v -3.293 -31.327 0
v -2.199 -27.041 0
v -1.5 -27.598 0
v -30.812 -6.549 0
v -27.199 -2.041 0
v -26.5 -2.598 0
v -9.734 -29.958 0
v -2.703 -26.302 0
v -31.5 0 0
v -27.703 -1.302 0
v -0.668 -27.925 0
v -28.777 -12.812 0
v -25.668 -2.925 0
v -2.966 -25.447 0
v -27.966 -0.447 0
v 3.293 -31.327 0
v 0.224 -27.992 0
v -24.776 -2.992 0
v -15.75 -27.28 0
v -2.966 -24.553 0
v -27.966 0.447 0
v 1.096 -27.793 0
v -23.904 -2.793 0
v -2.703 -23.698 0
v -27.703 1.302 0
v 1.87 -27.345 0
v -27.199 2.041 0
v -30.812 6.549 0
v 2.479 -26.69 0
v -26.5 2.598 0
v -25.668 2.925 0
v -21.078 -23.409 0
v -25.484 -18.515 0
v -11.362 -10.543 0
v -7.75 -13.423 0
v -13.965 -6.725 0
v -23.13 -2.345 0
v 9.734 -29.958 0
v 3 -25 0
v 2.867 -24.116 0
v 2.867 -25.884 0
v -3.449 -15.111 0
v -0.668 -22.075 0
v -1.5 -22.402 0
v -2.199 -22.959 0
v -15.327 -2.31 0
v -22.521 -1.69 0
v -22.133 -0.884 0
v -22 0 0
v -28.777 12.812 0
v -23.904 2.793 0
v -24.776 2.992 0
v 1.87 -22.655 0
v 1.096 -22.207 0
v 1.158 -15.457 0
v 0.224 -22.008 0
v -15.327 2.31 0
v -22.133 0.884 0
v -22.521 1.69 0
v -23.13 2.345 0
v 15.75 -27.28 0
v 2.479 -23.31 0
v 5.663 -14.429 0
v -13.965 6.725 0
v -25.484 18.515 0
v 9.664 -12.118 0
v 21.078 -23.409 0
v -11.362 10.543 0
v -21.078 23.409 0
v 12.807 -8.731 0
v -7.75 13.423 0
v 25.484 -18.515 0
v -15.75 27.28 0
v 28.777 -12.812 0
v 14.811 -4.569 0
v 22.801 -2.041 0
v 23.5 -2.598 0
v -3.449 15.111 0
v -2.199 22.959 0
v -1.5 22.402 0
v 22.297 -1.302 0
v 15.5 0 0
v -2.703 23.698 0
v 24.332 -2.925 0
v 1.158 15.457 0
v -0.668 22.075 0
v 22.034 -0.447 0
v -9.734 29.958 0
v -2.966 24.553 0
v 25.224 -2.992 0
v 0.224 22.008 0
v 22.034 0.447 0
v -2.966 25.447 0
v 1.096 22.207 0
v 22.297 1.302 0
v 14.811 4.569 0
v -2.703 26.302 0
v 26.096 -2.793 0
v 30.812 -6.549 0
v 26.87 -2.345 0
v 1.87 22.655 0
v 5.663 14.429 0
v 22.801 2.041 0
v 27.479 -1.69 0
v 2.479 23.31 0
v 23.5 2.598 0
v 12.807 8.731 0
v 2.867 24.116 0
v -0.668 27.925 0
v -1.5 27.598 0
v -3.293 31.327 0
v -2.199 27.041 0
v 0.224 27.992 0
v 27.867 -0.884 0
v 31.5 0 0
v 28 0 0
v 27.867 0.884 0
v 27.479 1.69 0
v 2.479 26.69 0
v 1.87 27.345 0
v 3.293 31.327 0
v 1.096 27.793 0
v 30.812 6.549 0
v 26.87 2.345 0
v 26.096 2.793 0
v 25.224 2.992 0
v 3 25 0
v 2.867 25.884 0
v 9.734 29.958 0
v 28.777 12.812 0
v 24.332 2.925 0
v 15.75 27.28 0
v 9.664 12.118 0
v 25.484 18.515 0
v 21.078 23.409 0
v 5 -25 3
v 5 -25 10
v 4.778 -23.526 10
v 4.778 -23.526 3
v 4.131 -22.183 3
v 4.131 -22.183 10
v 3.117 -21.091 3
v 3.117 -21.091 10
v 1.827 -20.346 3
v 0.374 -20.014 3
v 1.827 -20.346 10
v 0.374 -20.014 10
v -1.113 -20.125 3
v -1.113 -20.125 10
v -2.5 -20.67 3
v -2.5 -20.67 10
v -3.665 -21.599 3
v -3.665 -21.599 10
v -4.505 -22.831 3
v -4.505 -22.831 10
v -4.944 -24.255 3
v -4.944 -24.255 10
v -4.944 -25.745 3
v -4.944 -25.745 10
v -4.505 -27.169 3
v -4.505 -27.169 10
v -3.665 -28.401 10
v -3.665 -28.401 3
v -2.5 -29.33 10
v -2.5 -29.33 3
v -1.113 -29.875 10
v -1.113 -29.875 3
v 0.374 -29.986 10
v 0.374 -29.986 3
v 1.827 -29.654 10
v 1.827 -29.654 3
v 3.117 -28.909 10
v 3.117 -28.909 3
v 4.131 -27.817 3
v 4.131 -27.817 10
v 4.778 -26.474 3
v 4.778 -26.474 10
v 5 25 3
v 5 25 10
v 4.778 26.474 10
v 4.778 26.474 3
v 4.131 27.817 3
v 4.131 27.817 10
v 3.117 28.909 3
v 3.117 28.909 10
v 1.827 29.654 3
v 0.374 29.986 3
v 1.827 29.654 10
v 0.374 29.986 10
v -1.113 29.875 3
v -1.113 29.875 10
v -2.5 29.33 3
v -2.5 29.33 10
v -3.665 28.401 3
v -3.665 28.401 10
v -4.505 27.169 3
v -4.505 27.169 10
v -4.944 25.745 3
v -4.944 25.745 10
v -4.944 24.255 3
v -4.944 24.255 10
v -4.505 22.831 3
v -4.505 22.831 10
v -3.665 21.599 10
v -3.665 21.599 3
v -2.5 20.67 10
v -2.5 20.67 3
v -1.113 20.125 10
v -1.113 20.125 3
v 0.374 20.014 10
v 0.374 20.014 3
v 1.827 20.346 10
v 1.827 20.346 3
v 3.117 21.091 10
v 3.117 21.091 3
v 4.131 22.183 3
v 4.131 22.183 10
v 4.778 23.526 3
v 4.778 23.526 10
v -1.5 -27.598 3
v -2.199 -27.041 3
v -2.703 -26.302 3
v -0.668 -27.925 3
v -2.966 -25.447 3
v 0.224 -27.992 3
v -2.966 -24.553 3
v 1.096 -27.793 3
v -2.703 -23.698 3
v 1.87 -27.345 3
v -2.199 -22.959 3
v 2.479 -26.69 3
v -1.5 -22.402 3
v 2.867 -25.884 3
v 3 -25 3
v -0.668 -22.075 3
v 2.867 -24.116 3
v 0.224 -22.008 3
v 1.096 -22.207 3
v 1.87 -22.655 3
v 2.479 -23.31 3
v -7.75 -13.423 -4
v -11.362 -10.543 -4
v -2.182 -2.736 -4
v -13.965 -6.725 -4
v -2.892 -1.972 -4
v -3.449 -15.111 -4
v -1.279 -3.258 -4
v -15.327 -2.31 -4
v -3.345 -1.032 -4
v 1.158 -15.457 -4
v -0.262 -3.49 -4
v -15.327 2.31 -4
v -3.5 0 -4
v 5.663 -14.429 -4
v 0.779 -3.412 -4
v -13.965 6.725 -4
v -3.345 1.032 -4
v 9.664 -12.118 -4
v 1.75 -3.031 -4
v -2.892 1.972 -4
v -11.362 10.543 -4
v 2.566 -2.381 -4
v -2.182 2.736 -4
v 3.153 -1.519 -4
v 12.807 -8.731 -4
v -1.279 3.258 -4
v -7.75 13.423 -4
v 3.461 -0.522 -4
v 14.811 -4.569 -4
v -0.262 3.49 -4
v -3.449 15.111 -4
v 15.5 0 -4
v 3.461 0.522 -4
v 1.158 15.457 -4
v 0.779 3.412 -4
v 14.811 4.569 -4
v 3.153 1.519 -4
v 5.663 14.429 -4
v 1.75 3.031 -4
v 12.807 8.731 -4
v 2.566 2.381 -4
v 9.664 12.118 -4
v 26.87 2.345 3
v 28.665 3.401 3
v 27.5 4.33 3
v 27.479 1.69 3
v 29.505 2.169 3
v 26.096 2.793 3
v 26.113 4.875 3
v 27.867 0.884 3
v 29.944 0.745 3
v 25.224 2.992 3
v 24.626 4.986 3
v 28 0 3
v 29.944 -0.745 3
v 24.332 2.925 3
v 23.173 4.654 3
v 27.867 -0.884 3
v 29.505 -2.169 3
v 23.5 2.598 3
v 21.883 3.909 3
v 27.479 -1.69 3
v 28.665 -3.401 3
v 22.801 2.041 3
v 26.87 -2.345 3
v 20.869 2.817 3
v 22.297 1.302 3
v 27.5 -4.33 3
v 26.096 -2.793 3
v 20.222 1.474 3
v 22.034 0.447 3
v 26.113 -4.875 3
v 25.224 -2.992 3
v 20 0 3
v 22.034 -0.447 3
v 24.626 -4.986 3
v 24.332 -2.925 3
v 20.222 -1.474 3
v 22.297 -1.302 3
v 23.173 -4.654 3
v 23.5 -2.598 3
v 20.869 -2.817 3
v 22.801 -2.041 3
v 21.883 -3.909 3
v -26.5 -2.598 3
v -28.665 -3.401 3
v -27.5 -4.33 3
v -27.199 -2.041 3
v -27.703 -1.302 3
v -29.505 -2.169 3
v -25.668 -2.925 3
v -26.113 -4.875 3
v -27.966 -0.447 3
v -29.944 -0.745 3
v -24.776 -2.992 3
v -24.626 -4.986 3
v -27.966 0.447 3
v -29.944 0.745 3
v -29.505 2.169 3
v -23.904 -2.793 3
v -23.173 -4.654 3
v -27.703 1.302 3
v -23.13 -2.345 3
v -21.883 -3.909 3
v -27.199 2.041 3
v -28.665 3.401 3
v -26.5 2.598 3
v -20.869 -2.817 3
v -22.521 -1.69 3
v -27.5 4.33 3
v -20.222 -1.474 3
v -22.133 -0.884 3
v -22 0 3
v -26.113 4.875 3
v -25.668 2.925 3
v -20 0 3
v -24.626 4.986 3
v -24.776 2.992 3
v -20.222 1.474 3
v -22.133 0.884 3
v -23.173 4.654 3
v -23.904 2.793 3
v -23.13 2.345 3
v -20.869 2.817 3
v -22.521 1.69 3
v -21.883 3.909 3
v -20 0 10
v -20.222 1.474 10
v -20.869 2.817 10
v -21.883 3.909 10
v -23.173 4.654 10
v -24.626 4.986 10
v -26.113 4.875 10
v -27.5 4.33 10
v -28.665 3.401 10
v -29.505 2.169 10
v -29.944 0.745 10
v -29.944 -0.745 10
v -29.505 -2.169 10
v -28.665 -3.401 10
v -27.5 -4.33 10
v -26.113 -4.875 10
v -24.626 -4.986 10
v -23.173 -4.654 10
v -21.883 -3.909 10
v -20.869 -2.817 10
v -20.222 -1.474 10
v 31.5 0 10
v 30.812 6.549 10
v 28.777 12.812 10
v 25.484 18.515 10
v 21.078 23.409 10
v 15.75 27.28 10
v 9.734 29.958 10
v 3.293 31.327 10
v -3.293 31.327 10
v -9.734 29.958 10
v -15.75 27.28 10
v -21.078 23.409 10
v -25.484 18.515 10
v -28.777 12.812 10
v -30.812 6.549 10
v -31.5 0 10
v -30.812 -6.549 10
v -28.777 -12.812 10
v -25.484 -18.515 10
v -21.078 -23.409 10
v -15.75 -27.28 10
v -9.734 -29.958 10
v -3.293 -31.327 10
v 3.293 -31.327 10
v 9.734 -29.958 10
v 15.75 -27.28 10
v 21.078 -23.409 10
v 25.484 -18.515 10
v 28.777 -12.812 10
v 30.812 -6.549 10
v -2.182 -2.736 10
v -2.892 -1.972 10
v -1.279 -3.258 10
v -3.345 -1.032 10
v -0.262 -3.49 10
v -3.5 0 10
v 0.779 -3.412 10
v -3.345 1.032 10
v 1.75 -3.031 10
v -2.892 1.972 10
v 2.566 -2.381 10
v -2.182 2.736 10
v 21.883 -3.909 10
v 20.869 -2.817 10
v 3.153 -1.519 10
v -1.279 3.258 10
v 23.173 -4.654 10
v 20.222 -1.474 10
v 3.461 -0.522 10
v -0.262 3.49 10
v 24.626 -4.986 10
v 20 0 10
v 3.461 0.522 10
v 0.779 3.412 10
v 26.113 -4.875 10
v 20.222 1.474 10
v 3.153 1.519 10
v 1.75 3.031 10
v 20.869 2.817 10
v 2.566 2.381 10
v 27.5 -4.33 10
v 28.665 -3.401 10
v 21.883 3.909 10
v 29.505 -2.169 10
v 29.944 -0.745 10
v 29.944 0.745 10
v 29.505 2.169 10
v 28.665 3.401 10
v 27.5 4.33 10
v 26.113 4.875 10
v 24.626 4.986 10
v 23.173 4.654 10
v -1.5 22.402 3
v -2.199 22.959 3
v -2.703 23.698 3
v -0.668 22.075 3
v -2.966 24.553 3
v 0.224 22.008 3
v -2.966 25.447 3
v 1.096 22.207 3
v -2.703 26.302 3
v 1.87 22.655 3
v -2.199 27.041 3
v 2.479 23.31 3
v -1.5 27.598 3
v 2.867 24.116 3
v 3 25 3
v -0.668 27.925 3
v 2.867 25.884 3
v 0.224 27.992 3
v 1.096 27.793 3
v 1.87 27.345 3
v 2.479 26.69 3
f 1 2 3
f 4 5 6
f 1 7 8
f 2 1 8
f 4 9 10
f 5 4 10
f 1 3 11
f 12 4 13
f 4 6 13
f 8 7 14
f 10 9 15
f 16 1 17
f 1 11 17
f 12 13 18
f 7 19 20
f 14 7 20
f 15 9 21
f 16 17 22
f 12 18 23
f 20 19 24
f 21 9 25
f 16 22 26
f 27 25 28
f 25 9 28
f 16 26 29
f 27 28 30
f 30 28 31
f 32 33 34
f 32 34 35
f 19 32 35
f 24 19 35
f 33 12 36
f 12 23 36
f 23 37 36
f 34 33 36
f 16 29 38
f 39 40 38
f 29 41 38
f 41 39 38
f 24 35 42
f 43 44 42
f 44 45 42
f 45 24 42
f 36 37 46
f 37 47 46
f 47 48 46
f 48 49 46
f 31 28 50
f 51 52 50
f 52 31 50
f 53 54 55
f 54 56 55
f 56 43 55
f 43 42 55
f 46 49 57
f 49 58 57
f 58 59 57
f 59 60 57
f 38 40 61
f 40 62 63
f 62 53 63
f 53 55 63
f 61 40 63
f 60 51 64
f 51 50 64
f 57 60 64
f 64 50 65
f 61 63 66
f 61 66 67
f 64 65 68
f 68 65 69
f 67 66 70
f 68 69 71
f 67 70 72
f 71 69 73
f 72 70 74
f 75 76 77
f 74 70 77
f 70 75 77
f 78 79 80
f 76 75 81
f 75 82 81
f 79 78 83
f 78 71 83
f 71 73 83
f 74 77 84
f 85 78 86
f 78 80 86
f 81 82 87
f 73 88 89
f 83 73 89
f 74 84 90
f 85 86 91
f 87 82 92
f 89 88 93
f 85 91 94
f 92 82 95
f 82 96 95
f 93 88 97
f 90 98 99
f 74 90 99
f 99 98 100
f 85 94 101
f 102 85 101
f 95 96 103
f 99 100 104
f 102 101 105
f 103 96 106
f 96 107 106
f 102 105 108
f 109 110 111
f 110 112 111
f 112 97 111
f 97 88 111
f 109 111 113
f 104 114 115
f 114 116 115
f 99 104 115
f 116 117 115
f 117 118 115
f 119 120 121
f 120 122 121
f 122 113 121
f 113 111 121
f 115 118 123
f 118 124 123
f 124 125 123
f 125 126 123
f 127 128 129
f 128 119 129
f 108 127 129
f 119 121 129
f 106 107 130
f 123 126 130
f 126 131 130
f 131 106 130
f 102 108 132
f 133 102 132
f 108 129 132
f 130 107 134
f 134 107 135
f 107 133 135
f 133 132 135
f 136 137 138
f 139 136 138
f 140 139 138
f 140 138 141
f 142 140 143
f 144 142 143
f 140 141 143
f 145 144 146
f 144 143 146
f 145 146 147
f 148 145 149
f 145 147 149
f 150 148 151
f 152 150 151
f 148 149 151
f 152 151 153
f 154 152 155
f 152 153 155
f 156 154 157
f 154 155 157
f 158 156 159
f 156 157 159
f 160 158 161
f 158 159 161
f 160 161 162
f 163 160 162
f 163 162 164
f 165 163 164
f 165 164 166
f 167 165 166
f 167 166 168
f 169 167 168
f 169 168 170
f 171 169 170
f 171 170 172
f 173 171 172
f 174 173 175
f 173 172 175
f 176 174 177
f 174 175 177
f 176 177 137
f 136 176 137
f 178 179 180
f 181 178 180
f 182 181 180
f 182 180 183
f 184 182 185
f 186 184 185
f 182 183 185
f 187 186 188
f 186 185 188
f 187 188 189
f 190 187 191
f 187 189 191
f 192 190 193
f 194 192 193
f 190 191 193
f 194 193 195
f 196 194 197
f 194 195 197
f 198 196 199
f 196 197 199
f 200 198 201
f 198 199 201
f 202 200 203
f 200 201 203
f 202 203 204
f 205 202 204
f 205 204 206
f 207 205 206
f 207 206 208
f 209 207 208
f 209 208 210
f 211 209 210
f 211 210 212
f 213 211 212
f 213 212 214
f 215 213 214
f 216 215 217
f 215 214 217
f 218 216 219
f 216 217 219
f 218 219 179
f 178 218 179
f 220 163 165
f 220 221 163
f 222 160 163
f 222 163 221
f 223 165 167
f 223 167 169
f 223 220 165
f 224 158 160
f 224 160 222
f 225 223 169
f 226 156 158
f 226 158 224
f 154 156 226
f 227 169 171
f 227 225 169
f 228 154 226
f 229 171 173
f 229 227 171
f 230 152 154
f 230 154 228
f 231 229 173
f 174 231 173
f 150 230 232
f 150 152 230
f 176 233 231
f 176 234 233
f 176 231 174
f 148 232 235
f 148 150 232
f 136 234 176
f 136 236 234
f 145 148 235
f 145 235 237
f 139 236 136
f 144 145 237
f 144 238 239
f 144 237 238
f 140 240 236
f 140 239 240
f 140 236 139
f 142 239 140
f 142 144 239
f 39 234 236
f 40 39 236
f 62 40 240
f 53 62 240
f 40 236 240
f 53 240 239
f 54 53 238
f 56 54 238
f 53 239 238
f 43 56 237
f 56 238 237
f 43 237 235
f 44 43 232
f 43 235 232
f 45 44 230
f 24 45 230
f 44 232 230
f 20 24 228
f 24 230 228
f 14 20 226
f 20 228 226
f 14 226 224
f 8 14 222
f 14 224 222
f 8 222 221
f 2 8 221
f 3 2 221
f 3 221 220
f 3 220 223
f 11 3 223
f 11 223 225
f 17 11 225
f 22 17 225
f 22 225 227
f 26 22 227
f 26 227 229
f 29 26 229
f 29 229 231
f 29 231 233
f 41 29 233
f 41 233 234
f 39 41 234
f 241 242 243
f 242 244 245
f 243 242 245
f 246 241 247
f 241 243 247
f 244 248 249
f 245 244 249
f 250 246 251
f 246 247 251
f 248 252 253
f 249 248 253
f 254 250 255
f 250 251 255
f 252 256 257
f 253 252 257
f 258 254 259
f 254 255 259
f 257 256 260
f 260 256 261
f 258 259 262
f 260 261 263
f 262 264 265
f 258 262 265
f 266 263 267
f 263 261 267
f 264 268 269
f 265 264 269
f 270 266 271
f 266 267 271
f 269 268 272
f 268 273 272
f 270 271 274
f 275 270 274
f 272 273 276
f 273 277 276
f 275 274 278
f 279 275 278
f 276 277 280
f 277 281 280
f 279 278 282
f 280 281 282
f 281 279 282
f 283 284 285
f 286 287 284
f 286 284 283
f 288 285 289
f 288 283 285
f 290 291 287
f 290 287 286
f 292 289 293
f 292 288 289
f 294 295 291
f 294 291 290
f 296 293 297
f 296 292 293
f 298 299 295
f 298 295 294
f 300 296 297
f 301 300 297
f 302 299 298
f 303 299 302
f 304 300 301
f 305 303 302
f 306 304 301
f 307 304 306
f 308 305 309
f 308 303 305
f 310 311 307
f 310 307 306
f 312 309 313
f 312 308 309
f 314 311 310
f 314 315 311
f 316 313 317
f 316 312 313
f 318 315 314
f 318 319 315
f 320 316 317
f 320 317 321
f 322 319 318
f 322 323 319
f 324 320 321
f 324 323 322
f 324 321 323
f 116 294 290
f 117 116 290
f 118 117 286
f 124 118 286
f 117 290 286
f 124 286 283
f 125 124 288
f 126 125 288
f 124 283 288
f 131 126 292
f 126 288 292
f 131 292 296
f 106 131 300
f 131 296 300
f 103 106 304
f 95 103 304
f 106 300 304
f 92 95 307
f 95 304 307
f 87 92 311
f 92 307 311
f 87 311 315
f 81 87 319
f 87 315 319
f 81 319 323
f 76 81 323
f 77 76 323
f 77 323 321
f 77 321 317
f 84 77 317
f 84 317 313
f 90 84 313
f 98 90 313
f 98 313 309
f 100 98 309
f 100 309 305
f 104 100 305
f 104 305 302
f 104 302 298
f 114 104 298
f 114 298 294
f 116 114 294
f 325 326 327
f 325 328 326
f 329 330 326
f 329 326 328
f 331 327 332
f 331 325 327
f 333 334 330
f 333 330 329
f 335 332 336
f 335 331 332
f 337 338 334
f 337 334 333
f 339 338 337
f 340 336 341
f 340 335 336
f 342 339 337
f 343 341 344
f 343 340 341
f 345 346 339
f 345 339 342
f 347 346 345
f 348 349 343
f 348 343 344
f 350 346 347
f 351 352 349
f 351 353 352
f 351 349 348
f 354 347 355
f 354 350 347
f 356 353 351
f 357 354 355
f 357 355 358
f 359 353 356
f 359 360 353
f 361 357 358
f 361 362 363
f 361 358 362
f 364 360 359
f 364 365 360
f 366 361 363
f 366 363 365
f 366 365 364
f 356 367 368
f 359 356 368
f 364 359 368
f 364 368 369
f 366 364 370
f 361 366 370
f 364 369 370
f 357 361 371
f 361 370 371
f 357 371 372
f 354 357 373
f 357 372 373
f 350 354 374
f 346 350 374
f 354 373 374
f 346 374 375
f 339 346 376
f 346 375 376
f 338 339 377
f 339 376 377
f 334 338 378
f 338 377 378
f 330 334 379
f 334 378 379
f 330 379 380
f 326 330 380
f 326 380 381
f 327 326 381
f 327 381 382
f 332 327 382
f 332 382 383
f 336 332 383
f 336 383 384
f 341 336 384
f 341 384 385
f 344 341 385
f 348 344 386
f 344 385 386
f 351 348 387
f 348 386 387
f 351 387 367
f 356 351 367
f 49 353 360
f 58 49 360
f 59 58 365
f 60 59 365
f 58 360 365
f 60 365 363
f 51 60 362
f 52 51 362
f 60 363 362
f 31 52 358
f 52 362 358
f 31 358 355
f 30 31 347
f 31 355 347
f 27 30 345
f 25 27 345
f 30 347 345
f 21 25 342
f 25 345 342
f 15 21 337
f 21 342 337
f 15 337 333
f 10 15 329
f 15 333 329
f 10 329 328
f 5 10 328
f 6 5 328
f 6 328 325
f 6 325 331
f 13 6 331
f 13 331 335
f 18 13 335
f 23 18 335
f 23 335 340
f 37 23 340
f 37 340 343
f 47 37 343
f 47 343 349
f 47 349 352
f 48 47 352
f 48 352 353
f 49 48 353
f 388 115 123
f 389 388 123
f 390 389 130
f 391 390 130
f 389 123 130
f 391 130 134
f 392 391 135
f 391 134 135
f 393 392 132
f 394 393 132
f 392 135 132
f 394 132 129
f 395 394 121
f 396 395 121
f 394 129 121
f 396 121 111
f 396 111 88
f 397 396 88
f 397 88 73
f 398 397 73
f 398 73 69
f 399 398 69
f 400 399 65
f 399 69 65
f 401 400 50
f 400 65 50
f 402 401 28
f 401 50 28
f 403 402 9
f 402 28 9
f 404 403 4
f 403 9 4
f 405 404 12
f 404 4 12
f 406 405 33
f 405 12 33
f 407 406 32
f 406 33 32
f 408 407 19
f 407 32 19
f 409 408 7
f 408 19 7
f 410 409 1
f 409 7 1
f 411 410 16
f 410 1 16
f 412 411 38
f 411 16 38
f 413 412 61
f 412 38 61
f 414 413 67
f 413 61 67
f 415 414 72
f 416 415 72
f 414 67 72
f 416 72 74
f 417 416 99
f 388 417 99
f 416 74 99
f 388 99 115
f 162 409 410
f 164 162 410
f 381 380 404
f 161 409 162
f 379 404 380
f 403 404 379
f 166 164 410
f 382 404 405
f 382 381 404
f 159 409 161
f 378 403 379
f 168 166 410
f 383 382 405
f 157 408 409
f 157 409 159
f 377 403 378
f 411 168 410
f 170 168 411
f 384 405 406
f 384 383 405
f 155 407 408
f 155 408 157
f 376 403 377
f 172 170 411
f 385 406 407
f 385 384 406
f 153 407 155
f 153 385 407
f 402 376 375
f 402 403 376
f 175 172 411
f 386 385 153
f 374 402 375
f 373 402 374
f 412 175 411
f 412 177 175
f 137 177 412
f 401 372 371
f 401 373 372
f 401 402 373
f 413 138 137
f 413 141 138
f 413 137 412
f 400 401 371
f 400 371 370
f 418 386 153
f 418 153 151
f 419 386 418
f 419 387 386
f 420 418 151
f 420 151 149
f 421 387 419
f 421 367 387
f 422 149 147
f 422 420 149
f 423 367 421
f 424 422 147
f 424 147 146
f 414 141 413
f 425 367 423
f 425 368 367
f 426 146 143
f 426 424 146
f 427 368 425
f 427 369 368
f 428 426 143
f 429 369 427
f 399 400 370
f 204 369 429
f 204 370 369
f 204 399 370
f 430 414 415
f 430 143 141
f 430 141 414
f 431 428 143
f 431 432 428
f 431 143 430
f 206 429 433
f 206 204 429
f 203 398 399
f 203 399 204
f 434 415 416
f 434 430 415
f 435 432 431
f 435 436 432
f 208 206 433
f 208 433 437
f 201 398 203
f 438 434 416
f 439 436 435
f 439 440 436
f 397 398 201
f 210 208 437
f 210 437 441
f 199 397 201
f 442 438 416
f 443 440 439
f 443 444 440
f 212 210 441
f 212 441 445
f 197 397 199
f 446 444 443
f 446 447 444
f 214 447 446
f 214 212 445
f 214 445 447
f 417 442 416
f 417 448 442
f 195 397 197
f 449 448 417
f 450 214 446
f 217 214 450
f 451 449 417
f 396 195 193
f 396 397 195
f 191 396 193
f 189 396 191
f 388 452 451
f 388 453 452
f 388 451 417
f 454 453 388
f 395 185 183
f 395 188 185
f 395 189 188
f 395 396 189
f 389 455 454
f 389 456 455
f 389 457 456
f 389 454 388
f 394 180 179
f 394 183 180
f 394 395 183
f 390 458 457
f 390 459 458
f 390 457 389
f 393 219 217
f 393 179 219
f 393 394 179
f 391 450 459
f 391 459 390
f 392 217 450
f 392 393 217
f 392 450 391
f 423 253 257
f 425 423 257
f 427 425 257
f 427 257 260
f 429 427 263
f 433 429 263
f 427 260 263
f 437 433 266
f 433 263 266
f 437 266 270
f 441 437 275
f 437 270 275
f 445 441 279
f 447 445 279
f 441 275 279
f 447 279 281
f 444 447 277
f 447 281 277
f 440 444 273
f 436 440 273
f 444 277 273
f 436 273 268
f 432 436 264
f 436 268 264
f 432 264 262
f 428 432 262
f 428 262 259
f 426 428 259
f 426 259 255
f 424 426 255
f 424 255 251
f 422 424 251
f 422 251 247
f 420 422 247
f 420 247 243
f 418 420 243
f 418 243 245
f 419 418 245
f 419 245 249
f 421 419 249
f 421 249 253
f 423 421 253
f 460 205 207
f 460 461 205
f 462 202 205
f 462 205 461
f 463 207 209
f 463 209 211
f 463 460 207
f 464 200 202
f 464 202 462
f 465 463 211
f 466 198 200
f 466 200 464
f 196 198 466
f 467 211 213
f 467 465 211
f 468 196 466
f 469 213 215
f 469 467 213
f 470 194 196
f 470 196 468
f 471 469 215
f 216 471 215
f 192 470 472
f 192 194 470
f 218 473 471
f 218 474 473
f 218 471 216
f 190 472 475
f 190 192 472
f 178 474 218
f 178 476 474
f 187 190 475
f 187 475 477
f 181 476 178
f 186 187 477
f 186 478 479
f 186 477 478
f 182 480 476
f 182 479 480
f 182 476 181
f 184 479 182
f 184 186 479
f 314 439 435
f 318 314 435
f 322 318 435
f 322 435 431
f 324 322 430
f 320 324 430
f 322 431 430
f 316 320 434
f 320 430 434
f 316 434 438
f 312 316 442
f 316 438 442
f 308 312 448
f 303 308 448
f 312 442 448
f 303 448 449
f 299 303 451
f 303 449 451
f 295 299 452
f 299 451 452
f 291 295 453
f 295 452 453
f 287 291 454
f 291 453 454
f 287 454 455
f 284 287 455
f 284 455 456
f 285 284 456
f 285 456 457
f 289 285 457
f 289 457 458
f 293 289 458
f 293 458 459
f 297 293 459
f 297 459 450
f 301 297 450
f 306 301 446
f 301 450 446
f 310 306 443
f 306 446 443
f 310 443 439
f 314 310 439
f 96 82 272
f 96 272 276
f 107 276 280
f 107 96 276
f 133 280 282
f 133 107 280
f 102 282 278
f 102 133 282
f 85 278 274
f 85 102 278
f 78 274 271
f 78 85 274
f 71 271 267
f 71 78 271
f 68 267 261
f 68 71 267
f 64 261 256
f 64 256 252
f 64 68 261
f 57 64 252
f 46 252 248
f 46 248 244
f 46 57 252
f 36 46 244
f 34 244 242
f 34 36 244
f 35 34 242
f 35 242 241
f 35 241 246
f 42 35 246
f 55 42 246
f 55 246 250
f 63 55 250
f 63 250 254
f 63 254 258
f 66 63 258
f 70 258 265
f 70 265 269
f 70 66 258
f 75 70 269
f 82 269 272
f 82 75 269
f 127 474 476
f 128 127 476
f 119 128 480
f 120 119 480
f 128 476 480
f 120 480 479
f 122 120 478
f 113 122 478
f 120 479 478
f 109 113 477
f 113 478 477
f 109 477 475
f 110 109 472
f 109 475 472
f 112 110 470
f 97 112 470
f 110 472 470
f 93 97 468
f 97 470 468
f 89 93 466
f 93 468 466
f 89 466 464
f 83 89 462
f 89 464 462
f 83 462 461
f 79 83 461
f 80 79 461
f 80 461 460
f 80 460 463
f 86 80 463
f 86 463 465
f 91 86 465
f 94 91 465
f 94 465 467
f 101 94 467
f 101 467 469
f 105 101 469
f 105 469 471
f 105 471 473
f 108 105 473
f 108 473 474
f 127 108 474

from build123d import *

# Parameters (mm, degrees)
SKETCH1_R               = 31.5
BOSS_EXTRUDE1_DEPTH     = 10
SKETCH1_3_R             = 15.5
BOSS_EXTRUDE2_DEPTH     = 4
SKETCH2_R               = 3.5
CUT_EXTRUDE1_DEPTH      = 47.695824224
SKETCH3_R               = 5
SKETCH3_R_2             = 3
CUT_EXTRUDE2_DEPTH      = 7
CUT_EXTRUDE3_DEPTH      = 47.695824224
CUT_EXTRUDE3_DEPTH_BACK = 47.695824224
SKETCH3_4_R             = 3


with BuildPart() as part:
    # Sketch1 → Boss-Extrude1 (new body)
    with BuildSketch(Plane.XY):
        Circle(SKETCH1_R)
    extrude(amount=BOSS_EXTRUDE1_DEPTH)

    # Sketch1<3> → Boss-Extrude2 (add)
    with BuildSketch(Plane.XY):
        Circle(SKETCH1_3_R)
    extrude(amount=-BOSS_EXTRUDE2_DEPTH)

    # Sketch2 → Cut-Extrude1 (cut, through all)
    with BuildSketch(Plane(origin=(0, 0, -4), x_dir=(-1, 0, 0), z_dir=(0, 0, -1))):
        Circle(SKETCH2_R)
    extrude(amount=-CUT_EXTRUDE1_DEPTH, mode=Mode.SUBTRACT)

    # Sketch3 → Cut-Extrude2 (cut)
    # profile 1 of 4: a face of its own
    with BuildSketch(Plane.XY.offset(10)):
        with Locations((25, 0)):
            Circle(SKETCH3_R)
    # profile 2 of 4: a face of its own
    with BuildSketch(Plane.XY.offset(10)):
        with Locations((0, 25)):
            Circle(SKETCH3_R)
        with Locations((0, 25)):
            Circle(SKETCH3_R_2, mode=Mode.SUBTRACT)
    # profile 3 of 4: a face of its own
    with BuildSketch(Plane.XY.offset(10)):
        with Locations((0, -25)):
            Circle(SKETCH3_R)
        with Locations((0, -25)):
            Circle(SKETCH3_R_2, mode=Mode.SUBTRACT)
    # profile 4 of 4: a face of its own
    with BuildSketch(Plane.XY.offset(10)):
        with Locations((-25, 0)):
            Circle(SKETCH3_R)
        with Locations((-25, 0)):
            Circle(SKETCH3_R_2, mode=Mode.SUBTRACT)
    extrude(amount=-CUT_EXTRUDE2_DEPTH, mode=Mode.SUBTRACT)

    # Sketch3<4> → Cut-Extrude3 (cut, two sides: drawn at the far end of the back side and taken through both)
    with BuildSketch(Plane.XY.offset(10).offset(-CUT_EXTRUDE3_DEPTH_BACK)):
        with Locations((25, 0)):
            Circle(SKETCH3_4_R)
        with Locations((0, 25)):
            Circle(SKETCH3_4_R)
        with Locations((0, -25)):
            Circle(SKETCH3_4_R)
        with Locations((-25, 0)):
            Circle(SKETCH3_4_R)
    extrude(amount=CUT_EXTRUDE3_DEPTH + CUT_EXTRUDE3_DEPTH_BACK, mode=Mode.SUBTRACT)


solid = part.part
